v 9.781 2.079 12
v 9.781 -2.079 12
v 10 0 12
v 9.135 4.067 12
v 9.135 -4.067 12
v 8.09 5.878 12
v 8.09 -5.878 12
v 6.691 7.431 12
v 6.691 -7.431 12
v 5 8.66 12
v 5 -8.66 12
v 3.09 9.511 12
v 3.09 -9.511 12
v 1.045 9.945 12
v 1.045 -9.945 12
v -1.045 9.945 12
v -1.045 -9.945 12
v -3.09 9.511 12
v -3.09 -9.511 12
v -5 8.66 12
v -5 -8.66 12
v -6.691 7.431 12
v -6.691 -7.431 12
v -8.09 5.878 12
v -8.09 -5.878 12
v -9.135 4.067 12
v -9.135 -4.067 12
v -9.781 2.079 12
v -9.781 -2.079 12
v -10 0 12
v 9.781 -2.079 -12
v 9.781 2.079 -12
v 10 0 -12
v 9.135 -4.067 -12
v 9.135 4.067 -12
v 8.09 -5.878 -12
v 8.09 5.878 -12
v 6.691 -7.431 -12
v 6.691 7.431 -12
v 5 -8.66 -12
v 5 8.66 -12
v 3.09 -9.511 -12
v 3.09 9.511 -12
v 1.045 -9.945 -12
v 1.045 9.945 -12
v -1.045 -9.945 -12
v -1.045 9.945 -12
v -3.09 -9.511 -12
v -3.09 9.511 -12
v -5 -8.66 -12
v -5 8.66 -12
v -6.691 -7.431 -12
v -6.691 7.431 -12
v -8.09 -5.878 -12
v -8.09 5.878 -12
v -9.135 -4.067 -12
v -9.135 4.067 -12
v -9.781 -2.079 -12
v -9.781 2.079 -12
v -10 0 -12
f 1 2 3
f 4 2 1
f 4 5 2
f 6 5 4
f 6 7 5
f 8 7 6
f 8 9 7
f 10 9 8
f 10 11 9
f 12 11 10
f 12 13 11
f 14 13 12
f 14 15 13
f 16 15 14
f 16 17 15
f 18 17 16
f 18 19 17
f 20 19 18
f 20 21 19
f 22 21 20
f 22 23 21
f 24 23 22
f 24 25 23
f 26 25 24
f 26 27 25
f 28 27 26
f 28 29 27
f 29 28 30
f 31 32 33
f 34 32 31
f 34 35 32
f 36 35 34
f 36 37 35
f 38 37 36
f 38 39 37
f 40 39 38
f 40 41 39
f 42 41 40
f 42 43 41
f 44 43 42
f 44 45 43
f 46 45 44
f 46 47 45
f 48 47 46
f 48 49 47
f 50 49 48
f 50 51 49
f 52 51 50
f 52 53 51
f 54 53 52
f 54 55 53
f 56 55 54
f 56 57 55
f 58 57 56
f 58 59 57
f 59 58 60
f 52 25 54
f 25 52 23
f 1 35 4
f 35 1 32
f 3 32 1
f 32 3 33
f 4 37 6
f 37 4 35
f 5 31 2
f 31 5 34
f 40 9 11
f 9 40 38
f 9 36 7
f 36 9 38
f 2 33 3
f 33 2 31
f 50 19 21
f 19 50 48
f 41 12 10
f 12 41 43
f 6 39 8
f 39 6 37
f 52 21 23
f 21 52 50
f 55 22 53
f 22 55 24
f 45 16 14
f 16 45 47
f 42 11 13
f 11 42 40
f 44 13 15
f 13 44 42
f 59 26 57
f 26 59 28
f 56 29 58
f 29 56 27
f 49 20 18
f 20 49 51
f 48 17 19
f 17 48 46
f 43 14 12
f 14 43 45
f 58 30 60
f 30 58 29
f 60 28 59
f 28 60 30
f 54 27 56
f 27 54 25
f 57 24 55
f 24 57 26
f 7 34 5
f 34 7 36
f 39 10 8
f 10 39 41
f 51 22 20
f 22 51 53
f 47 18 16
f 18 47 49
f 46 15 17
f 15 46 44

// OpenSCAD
intersection(){
  cube([24, 24, 24], center=true);
  cylinder(h=24, r1=10, r2=10, center=true);
}
